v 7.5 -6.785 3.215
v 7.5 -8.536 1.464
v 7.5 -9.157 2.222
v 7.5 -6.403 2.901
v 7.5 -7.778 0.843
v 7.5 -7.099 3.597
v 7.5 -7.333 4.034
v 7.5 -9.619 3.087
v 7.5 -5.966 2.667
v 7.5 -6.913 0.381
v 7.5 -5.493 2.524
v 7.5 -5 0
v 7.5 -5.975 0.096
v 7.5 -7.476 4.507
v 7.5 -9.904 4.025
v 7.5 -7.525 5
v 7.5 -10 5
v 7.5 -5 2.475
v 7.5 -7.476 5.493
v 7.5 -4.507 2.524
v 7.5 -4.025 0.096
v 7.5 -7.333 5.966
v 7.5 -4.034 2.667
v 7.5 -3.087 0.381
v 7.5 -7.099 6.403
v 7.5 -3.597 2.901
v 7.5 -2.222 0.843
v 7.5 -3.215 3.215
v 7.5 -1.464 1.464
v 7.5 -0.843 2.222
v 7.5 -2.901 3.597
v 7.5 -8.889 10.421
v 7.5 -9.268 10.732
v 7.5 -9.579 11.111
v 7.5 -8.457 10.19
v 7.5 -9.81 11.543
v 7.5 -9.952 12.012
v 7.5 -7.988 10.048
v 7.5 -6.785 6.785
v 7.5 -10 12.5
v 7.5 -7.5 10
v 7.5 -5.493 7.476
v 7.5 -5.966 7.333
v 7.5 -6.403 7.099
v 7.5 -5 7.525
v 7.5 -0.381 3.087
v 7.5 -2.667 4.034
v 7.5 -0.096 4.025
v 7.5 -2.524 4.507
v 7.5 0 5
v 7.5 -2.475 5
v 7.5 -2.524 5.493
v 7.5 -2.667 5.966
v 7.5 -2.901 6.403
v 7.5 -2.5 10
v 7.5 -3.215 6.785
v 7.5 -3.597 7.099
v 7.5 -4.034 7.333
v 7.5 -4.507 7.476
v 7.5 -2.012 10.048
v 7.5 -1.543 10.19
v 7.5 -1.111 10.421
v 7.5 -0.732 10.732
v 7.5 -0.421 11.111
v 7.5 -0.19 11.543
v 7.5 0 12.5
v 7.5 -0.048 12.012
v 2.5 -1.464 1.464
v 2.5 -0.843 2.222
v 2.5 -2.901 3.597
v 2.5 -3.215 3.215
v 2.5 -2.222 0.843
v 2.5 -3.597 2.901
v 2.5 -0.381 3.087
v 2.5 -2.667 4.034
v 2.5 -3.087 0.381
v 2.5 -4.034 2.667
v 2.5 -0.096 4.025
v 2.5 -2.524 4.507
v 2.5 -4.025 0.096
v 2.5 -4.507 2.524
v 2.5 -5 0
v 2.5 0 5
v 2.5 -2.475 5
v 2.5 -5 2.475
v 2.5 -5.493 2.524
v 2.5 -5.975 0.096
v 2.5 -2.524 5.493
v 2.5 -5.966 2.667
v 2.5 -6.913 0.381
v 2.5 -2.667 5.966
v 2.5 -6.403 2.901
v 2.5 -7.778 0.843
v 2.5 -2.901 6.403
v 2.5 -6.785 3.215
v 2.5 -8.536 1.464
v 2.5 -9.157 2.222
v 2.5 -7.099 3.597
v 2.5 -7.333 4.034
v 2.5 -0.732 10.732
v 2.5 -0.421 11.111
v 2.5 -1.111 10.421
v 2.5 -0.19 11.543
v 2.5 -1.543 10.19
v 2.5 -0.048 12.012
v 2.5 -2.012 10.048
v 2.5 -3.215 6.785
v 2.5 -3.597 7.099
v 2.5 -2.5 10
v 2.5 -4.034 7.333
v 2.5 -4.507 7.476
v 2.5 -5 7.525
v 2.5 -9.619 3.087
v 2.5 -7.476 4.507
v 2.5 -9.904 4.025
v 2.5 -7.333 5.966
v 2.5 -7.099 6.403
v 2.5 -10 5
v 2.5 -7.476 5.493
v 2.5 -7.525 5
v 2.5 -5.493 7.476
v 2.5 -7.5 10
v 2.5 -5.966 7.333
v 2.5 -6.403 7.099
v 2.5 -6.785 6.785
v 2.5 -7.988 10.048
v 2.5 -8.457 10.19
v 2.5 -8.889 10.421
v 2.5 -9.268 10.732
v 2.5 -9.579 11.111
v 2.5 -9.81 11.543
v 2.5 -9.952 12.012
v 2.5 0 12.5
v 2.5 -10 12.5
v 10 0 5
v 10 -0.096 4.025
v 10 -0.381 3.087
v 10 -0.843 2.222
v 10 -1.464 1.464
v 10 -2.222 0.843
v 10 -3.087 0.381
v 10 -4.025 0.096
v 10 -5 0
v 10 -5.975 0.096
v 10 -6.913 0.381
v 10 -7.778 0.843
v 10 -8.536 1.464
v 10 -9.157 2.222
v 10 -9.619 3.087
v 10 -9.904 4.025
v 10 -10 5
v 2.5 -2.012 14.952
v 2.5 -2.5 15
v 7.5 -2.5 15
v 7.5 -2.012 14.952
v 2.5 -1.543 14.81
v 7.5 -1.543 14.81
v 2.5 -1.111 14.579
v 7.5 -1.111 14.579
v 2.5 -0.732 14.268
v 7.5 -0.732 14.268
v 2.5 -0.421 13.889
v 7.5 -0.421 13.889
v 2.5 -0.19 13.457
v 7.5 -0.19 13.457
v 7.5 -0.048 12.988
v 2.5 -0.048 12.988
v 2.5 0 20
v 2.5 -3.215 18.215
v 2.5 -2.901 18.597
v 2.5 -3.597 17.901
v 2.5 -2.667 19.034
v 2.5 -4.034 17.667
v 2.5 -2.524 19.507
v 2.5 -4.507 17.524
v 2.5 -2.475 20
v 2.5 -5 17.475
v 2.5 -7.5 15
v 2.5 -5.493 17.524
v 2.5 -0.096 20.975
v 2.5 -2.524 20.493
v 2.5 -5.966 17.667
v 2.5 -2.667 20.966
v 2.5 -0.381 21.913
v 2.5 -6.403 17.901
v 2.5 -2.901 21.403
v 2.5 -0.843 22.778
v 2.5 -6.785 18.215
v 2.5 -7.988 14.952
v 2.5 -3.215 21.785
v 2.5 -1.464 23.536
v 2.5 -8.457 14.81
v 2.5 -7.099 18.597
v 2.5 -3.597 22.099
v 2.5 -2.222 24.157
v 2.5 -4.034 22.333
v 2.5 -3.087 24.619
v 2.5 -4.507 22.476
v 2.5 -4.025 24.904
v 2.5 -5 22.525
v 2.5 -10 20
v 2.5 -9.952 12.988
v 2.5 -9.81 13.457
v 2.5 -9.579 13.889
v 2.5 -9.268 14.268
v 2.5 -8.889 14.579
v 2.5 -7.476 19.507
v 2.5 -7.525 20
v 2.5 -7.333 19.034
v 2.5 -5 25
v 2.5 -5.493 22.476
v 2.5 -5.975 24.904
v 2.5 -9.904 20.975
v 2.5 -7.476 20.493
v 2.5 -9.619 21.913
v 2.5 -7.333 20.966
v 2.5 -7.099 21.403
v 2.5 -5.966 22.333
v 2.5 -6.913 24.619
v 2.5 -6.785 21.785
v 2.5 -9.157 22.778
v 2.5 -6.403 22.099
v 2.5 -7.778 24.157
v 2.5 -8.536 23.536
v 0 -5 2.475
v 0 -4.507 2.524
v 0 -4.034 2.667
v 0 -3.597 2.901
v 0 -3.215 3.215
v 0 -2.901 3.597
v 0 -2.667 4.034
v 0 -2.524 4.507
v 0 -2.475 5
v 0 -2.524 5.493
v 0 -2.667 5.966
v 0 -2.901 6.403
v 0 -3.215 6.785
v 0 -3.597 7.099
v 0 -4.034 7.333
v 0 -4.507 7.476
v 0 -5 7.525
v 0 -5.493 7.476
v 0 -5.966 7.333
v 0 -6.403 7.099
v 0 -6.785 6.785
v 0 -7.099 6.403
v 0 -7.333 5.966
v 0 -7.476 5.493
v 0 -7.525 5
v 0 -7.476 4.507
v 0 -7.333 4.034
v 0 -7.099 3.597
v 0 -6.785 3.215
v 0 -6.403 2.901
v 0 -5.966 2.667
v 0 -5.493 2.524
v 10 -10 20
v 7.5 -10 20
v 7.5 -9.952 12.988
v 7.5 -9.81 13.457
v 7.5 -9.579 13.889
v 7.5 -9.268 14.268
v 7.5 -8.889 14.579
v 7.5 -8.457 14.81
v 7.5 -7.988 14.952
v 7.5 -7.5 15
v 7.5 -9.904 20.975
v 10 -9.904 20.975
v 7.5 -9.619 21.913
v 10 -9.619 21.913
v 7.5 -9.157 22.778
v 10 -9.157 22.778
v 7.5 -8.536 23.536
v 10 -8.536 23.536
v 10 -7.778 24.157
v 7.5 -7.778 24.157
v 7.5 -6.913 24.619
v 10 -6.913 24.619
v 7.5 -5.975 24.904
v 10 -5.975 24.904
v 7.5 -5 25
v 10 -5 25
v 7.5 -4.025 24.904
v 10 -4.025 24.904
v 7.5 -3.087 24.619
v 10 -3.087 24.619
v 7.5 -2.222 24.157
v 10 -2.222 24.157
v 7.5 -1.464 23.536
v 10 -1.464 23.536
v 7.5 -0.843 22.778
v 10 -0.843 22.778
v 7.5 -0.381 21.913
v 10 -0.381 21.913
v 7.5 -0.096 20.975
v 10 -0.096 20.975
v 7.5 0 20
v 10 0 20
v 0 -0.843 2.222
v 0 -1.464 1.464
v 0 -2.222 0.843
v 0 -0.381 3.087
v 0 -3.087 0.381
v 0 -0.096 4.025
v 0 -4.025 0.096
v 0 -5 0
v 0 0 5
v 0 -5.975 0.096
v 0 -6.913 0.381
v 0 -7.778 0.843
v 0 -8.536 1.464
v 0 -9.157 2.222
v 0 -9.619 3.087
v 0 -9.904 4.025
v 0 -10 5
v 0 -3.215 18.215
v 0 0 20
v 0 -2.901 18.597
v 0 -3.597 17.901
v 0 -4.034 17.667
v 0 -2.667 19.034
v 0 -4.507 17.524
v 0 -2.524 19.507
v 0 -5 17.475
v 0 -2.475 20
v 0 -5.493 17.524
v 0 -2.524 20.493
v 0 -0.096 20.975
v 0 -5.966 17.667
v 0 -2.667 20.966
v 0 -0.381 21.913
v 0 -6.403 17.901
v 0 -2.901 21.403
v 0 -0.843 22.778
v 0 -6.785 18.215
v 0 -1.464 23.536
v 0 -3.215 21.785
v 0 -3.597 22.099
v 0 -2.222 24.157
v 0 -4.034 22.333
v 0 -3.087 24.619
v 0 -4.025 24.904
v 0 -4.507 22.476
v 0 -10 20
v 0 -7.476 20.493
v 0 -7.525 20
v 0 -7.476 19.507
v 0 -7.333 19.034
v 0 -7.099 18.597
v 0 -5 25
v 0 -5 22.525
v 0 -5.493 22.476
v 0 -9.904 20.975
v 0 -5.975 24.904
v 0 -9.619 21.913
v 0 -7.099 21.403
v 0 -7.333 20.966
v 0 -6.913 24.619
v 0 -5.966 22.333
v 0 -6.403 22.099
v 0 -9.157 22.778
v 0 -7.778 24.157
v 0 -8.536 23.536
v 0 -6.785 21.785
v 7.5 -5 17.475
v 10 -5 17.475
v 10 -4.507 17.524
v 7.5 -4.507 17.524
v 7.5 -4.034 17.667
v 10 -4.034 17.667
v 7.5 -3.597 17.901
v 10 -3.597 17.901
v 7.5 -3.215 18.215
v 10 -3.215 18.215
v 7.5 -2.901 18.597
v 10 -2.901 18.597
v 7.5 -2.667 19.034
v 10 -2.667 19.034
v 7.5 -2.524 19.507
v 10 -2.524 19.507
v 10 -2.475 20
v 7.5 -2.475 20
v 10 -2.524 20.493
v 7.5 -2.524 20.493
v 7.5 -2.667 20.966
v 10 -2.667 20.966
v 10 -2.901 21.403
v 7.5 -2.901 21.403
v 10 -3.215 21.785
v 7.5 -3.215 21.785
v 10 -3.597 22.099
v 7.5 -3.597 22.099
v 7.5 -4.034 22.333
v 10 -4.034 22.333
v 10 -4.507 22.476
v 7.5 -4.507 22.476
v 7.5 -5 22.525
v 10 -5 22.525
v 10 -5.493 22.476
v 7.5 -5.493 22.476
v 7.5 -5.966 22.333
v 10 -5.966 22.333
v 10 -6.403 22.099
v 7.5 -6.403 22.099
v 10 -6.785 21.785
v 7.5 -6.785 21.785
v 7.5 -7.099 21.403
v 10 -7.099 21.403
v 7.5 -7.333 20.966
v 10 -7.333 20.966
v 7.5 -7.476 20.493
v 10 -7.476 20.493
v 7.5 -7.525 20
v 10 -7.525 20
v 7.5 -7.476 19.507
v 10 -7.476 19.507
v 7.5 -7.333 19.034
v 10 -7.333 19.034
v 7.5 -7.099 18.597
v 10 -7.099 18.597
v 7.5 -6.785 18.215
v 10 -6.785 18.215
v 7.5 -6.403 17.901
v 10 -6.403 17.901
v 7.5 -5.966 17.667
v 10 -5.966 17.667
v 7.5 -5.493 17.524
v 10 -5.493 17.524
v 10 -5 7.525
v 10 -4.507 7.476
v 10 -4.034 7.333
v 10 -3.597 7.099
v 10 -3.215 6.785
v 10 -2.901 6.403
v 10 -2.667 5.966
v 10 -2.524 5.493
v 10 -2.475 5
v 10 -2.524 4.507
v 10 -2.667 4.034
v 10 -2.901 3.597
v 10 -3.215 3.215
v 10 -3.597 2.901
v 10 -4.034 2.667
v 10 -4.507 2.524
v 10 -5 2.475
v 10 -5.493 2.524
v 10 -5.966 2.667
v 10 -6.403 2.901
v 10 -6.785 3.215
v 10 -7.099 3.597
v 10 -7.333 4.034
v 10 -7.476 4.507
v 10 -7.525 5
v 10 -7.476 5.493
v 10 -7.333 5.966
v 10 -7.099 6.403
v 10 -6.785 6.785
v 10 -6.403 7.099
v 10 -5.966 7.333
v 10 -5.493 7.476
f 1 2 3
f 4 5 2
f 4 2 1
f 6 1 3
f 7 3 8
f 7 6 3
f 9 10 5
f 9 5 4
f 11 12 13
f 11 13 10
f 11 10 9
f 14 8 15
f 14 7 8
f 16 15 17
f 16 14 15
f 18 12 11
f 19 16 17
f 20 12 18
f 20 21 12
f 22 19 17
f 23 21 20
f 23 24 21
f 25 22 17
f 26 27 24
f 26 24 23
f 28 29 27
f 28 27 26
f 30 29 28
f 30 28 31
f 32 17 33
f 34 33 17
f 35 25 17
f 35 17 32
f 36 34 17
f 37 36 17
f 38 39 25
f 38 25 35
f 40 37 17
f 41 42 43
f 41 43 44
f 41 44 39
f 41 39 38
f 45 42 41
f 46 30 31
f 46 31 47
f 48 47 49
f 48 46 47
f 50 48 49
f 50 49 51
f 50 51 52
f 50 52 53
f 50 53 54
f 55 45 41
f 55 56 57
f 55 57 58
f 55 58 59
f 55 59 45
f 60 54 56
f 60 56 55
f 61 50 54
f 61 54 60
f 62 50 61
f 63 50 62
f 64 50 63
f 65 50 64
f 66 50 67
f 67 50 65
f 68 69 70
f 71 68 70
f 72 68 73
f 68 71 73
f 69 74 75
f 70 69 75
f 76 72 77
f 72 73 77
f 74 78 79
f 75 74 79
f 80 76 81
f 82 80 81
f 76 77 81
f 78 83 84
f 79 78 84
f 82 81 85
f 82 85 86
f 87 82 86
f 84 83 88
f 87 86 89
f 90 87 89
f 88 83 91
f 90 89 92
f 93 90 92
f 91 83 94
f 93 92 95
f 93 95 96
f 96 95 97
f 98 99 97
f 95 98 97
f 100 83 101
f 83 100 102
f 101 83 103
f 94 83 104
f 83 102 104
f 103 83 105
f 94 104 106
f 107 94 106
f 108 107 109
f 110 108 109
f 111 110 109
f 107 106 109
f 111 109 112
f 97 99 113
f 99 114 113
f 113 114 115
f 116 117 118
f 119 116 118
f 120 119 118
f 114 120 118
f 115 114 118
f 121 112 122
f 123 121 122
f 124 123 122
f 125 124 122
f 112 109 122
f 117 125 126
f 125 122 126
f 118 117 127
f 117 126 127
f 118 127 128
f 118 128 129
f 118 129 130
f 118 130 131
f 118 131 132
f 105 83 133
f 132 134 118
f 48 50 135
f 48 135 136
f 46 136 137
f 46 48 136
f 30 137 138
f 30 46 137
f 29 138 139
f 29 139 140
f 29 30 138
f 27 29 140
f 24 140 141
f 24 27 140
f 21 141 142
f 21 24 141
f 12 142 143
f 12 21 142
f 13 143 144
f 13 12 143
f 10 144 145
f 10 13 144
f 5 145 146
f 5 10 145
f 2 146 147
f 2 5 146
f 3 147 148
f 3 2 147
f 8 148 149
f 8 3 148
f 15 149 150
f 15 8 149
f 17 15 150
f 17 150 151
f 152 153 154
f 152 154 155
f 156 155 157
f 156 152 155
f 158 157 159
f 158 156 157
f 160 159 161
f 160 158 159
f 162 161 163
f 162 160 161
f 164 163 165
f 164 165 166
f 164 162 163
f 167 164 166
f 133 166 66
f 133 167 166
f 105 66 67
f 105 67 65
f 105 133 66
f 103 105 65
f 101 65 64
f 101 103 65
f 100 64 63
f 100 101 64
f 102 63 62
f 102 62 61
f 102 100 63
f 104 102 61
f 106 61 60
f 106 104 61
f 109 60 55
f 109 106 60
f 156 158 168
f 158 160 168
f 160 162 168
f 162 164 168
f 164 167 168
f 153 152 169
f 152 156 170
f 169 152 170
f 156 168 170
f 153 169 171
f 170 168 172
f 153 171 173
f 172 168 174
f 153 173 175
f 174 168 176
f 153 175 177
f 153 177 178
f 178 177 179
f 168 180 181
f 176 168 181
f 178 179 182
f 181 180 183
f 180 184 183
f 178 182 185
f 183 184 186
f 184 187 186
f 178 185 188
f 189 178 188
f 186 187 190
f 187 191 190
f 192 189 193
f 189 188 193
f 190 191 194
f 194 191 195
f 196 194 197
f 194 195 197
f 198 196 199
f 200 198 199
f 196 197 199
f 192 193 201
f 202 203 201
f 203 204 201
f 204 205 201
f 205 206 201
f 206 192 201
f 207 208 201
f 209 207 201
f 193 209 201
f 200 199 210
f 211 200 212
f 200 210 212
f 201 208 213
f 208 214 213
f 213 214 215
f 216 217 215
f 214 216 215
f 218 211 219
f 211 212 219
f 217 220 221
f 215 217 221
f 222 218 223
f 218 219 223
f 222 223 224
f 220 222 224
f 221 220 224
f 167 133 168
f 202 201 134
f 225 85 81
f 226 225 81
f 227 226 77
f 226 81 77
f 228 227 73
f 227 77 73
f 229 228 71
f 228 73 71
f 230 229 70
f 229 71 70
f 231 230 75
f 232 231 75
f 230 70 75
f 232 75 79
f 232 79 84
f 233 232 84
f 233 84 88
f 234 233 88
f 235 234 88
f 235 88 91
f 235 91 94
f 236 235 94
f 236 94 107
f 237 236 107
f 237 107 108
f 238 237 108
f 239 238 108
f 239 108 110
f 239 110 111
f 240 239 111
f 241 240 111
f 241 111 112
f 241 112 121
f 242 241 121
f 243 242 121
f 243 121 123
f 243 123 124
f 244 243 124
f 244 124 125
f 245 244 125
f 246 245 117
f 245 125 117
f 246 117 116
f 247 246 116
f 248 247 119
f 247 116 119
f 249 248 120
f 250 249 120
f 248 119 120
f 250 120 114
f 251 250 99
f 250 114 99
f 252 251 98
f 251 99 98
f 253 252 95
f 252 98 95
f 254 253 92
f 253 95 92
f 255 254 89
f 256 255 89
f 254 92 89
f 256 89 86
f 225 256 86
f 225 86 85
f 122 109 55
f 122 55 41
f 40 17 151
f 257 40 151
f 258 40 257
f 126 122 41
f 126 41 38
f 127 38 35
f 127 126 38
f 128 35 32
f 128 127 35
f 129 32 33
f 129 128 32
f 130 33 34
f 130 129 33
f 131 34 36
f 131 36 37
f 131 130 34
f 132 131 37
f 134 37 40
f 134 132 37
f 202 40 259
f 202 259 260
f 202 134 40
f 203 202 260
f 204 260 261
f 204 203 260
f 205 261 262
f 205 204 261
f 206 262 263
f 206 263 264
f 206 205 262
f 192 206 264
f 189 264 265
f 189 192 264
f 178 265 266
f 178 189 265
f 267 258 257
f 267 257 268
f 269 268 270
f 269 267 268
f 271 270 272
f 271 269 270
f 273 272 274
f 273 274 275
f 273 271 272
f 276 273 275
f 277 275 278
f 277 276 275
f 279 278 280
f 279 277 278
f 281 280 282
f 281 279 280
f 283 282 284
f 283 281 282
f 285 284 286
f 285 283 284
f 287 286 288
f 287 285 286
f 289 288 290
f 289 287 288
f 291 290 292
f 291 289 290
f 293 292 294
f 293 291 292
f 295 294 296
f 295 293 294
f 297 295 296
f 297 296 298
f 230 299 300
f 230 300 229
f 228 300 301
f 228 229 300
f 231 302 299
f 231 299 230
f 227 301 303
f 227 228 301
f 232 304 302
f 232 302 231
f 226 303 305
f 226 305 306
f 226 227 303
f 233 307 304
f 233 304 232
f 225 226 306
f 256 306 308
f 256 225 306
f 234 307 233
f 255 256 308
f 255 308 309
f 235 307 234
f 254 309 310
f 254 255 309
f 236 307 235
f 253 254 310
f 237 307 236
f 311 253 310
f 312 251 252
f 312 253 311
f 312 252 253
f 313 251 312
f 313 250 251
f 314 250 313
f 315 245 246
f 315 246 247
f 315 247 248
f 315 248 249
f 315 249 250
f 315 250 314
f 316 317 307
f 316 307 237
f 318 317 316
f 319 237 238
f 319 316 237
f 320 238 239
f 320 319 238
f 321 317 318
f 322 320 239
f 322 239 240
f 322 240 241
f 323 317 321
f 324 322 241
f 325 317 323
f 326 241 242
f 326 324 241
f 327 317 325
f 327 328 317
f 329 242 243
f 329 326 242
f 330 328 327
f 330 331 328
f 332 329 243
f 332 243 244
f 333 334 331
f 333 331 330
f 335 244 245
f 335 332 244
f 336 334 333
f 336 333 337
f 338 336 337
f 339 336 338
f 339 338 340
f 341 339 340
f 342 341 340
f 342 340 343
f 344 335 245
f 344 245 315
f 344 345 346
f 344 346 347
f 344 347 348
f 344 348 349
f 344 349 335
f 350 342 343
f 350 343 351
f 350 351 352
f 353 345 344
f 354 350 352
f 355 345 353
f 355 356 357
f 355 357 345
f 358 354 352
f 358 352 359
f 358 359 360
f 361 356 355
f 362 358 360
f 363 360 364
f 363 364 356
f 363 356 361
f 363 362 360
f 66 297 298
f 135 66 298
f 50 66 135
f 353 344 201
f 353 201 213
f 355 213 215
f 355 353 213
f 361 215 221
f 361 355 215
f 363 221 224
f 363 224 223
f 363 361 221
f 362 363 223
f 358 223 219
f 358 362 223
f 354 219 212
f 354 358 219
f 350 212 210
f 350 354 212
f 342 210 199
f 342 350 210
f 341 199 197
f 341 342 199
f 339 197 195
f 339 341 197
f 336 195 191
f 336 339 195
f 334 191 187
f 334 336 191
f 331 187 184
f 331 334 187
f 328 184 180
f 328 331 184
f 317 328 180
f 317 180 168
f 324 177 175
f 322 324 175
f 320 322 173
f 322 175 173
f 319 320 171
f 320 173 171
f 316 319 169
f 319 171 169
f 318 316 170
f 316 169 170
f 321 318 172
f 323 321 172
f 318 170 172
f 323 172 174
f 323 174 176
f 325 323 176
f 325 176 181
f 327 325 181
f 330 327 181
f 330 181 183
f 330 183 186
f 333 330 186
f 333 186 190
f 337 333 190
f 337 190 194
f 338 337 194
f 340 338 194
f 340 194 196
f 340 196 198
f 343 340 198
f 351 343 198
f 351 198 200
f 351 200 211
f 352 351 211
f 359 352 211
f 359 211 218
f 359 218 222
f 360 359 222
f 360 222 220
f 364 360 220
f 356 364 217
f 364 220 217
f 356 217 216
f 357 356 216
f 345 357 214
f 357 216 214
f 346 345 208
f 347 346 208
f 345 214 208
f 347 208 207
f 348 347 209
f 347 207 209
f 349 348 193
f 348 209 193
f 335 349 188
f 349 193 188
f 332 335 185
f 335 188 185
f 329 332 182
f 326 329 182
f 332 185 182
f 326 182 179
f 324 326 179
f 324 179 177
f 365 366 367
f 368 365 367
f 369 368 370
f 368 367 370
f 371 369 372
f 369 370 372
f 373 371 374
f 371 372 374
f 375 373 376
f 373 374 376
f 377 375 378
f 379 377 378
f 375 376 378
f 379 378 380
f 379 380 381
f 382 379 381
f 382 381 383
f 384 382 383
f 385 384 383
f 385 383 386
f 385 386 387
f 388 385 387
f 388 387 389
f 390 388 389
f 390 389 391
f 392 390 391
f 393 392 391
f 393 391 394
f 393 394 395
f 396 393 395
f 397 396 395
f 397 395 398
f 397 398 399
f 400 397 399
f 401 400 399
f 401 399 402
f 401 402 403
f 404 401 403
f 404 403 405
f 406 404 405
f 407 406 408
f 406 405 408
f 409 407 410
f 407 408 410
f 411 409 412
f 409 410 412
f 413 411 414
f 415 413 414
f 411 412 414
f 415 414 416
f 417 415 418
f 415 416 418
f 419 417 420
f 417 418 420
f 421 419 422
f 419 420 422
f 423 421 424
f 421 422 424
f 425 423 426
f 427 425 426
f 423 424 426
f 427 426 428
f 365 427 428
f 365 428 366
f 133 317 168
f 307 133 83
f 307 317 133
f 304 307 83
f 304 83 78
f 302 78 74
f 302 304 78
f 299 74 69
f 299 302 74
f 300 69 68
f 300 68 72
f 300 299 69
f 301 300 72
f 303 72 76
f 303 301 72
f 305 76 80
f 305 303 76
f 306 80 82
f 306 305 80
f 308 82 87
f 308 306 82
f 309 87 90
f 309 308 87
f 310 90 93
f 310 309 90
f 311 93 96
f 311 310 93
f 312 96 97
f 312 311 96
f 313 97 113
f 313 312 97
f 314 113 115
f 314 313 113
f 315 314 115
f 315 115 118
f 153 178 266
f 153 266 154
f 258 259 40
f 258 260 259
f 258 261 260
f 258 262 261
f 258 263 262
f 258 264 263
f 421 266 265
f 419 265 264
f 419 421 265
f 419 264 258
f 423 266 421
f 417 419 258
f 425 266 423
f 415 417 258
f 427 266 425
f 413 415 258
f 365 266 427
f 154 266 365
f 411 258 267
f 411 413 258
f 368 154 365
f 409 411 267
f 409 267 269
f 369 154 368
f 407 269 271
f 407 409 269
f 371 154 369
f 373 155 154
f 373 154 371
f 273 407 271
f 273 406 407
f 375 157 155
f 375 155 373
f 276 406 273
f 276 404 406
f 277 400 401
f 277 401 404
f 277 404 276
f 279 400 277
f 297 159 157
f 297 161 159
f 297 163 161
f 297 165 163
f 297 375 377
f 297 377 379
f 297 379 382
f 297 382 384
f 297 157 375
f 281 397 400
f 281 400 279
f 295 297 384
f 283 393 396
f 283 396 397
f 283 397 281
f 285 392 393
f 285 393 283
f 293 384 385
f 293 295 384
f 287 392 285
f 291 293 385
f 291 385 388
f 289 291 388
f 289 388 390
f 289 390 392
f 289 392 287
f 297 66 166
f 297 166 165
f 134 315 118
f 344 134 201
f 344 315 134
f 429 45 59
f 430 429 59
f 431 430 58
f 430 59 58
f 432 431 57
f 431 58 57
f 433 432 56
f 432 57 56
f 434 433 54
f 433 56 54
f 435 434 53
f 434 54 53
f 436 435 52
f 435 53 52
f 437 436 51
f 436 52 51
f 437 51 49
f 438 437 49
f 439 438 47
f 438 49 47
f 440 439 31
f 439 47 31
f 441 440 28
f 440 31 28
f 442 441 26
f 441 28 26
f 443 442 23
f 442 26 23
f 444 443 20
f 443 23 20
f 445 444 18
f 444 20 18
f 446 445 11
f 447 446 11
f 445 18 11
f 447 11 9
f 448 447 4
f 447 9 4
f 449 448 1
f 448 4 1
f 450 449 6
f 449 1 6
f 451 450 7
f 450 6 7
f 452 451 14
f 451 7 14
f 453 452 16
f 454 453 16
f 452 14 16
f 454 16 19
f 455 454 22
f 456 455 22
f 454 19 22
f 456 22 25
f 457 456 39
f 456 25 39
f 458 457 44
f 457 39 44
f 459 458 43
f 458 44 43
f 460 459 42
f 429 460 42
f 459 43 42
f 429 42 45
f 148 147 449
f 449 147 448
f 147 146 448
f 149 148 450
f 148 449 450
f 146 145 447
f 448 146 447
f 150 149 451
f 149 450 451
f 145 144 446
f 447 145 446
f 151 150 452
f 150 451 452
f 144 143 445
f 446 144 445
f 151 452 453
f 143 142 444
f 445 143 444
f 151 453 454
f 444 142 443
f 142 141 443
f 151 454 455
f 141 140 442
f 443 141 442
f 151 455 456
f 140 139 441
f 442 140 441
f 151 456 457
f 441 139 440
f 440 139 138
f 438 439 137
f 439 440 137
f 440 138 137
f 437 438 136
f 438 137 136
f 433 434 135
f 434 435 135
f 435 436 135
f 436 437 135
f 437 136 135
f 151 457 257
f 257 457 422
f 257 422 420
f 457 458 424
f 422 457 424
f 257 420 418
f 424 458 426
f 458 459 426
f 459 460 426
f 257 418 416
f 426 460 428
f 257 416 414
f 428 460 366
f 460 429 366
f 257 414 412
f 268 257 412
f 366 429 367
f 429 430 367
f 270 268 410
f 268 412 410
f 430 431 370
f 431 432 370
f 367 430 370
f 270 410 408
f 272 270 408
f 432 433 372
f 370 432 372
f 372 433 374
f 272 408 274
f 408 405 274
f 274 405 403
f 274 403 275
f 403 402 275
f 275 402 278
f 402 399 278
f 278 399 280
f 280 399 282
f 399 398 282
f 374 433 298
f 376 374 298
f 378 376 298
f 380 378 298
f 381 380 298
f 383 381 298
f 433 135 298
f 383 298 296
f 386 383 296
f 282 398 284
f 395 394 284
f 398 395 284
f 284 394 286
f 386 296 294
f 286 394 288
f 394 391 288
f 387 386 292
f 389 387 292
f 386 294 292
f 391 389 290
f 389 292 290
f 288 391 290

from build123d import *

# Parameters (mm, degrees)
BOSS_EXTRUDE1_DEPTH = 2.5
BOSS_EXTRUDE2_DEPTH = 5
BOSS_EXTRUDE3_DEPTH = 2.5
HOLE1_D             = 5.05
HOLE1_DEPTH         = 2.5
HOLE2_D             = 5.05
HOLE2_DEPTH         = 2.5
HOLE3_D             = 5.05
HOLE3_DEPTH         = 10


with BuildPart() as part:
    # Sketch1 → Boss-Extrude1 (new body)
    with BuildSketch(Plane(origin=(0, 0, 0), x_dir=(0, -1, 0), z_dir=(-1, 0, 0))):
        with BuildLine():
            Line((0, 20), (0, 5))
            ThreePointArc((0, 5), (5, 0), (10, 5))
            Line((10, 5), (10, 20))
            ThreePointArc((10, 20), (5, 25), (0, 20))
        make_face()
    extrude(amount=-BOSS_EXTRUDE1_DEPTH)

    # Sketch2 → Boss-Extrude2 (add)
    with BuildSketch(Plane(origin=(2.5, 0, 0), x_dir=(0, 0, -1), z_dir=(1, 0, 0))):
        with BuildLine():
            Line((-15, -7.5), (-15, -2.5))
            ThreePointArc((-15, -2.5), (-12.5, 0), (-10, -2.5))
            Line((-10, -2.5), (-10, -7.5))
            ThreePointArc((-10, -7.5), (-12.5, -10), (-15, -7.5))
        make_face()
    extrude(amount=BOSS_EXTRUDE2_DEPTH)

    # Sketch3 → Boss-Extrude3 (add)
    with BuildSketch(Plane(origin=(7.5, 0, 0), x_dir=(0, 0, -1), z_dir=(1, 0, 0))):
        with BuildLine():
            Line((-20, 0), (-5, 0))
            ThreePointArc((-5, 0), (0, -5), (-5, -10))
            Line((-5, -10), (-20, -10))
            ThreePointArc((-20, -10), (-25, -5), (-20, 0))
        make_face()
    extrude(amount=BOSS_EXTRUDE3_DEPTH)

    # Hole1
    with Locations(Plane(origin=(10, 0, 0), x_dir=(0, 0, -1), z_dir=(1, 0, 0))):
        with Locations((-5, -5)):
            Hole(HOLE1_D / 2, depth=HOLE1_DEPTH)

    # Hole2
    with Locations(Plane.ZY.offset(-7.5)):
        with Locations((20, -5)):
            Hole(HOLE2_D / 2, depth=HOLE2_DEPTH)

    # Hole3
    with Locations(Plane.ZY):
        with Locations((20, -5), (5, -5)):
            Hole(HOLE3_D / 2, depth=HOLE3_DEPTH)


solid = part.part
